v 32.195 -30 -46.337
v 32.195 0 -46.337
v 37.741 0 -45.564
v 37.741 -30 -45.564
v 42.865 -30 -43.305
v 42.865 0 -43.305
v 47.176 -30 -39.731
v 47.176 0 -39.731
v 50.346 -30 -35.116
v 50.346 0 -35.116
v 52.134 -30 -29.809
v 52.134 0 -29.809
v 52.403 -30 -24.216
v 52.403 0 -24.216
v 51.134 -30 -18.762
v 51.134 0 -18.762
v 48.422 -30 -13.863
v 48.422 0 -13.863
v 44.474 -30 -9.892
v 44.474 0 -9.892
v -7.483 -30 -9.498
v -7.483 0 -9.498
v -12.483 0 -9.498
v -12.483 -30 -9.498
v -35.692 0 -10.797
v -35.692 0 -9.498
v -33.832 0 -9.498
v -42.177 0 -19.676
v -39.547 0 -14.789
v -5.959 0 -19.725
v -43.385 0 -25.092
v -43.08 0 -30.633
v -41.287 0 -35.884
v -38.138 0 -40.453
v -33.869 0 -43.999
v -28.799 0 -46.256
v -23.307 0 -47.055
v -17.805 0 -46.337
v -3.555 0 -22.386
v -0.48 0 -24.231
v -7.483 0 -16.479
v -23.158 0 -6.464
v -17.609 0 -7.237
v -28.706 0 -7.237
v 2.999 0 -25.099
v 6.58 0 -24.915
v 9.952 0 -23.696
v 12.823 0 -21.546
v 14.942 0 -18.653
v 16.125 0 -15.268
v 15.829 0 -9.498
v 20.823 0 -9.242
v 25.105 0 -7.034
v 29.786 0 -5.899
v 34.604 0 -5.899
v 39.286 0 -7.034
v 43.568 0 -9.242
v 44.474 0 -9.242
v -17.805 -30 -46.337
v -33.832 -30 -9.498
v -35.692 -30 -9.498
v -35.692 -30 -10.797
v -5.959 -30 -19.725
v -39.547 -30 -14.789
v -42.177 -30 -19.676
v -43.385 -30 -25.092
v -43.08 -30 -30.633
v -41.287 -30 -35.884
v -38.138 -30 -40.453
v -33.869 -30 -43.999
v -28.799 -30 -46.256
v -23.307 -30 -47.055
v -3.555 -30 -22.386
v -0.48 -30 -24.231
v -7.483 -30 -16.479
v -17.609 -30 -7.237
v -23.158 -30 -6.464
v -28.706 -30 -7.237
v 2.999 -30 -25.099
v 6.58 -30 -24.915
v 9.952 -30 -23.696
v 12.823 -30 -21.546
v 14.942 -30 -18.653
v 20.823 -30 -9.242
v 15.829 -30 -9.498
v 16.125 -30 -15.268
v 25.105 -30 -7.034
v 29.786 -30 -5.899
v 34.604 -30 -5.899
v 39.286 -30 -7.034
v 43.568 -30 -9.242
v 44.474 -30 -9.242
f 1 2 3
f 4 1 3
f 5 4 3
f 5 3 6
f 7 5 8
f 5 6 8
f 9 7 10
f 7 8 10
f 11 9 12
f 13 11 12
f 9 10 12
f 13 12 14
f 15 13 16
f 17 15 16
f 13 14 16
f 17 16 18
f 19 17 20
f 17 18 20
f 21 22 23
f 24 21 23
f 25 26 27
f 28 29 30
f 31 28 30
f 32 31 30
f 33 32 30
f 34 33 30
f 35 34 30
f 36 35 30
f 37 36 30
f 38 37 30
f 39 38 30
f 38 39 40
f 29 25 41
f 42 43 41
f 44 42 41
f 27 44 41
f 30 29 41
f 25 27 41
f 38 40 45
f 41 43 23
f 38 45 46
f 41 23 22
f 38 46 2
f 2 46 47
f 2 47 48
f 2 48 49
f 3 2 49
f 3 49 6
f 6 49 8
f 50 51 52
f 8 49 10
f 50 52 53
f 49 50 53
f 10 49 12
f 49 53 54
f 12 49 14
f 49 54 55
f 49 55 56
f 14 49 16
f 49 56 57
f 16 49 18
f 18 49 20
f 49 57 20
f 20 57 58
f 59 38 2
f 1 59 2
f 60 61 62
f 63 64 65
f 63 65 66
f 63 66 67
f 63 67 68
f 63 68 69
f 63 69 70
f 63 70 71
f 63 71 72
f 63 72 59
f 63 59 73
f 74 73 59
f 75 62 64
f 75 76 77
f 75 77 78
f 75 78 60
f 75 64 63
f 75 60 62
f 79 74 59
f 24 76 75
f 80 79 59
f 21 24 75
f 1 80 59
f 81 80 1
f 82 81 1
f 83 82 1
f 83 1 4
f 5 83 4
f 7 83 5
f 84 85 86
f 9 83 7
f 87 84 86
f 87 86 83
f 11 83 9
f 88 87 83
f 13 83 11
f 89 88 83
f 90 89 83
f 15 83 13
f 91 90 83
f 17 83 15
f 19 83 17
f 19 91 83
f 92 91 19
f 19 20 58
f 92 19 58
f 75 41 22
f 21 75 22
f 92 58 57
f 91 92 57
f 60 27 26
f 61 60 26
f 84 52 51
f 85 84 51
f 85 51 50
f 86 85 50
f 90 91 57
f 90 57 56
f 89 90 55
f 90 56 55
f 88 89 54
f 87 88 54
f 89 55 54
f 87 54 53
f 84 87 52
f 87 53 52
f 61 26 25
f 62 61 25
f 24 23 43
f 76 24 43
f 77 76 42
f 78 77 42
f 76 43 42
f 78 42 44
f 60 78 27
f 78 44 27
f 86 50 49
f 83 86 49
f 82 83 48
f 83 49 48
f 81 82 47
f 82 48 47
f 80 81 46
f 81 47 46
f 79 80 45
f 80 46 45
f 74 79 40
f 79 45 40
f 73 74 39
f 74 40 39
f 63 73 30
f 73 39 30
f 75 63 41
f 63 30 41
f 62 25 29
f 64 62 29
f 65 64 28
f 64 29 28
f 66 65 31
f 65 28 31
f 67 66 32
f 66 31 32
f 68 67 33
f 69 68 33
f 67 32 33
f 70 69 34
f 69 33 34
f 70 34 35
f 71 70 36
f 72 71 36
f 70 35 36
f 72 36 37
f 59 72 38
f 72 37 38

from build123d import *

# Parameters (mm, degrees)
F1_DEPTH = 30


with BuildPart() as f1:
    # F0 (on Front) → F1 (new body)
    with BuildSketch(Plane.XZ):
        with BuildLine():
            ThreePointArc((-35.692446, -10.797127), (-41.286589, -35.884078), (-17.804858, -46.336725))
            Line((-17.804858, -46.336725), (32.195142, -46.336725))
            ThreePointArc((32.195142, -46.336725), (51.423961, -32.524361), (44.473924, -9.891954))
            ThreePointArc((44.473924, -9.891954), (44.025197, -9.560505), (43.567529, -9.241517))
            ThreePointArc((43.567529, -9.241517), (32.195142, -5.755051), (20.822756, -9.241517))
            Line((20.822756, -9.241517), (15.829317, -9.49759))
            Line((15.829317, -9.49759), (16.125229, -15.267867))
            ThreePointArc((16.125229, -15.267867), (4.796341, -25.139633), (-7.482951, -16.478543))
            Line((-7.482951, -16.478543), (-7.482951, -9.49759))
            Line((-7.482951, -9.49759), (-12.482951, -9.49759))
            ThreePointArc((-12.482951, -9.49759), (-23.157559, -6.463665), (-33.832168, -9.49759))
            ThreePointArc((-33.832168, -9.49759), (-34.780484, -10.121339), (-35.692446, -10.797127))
        make_face()
        with BuildLine():
            Line((-35.692446, -9.49759), (-35.692446, -10.797127))
            ThreePointArc((-35.692446, -10.797127), (-34.780484, -10.121339), (-33.832168, -9.49759))
            Line((-33.832168, -9.49759), (-35.692446, -9.49759))
        make_face()
        with BuildLine():
            ThreePointArc((43.567529, -9.241517), (44.025197, -9.560505), (44.473924, -9.891954))
            Line((44.473924, -9.891954), (44.473924, -9.241517))
            Line((44.473924, -9.241517), (43.567529, -9.241517))
        make_face()
    extrude(amount=F1_DEPTH)


solid = f1.part
